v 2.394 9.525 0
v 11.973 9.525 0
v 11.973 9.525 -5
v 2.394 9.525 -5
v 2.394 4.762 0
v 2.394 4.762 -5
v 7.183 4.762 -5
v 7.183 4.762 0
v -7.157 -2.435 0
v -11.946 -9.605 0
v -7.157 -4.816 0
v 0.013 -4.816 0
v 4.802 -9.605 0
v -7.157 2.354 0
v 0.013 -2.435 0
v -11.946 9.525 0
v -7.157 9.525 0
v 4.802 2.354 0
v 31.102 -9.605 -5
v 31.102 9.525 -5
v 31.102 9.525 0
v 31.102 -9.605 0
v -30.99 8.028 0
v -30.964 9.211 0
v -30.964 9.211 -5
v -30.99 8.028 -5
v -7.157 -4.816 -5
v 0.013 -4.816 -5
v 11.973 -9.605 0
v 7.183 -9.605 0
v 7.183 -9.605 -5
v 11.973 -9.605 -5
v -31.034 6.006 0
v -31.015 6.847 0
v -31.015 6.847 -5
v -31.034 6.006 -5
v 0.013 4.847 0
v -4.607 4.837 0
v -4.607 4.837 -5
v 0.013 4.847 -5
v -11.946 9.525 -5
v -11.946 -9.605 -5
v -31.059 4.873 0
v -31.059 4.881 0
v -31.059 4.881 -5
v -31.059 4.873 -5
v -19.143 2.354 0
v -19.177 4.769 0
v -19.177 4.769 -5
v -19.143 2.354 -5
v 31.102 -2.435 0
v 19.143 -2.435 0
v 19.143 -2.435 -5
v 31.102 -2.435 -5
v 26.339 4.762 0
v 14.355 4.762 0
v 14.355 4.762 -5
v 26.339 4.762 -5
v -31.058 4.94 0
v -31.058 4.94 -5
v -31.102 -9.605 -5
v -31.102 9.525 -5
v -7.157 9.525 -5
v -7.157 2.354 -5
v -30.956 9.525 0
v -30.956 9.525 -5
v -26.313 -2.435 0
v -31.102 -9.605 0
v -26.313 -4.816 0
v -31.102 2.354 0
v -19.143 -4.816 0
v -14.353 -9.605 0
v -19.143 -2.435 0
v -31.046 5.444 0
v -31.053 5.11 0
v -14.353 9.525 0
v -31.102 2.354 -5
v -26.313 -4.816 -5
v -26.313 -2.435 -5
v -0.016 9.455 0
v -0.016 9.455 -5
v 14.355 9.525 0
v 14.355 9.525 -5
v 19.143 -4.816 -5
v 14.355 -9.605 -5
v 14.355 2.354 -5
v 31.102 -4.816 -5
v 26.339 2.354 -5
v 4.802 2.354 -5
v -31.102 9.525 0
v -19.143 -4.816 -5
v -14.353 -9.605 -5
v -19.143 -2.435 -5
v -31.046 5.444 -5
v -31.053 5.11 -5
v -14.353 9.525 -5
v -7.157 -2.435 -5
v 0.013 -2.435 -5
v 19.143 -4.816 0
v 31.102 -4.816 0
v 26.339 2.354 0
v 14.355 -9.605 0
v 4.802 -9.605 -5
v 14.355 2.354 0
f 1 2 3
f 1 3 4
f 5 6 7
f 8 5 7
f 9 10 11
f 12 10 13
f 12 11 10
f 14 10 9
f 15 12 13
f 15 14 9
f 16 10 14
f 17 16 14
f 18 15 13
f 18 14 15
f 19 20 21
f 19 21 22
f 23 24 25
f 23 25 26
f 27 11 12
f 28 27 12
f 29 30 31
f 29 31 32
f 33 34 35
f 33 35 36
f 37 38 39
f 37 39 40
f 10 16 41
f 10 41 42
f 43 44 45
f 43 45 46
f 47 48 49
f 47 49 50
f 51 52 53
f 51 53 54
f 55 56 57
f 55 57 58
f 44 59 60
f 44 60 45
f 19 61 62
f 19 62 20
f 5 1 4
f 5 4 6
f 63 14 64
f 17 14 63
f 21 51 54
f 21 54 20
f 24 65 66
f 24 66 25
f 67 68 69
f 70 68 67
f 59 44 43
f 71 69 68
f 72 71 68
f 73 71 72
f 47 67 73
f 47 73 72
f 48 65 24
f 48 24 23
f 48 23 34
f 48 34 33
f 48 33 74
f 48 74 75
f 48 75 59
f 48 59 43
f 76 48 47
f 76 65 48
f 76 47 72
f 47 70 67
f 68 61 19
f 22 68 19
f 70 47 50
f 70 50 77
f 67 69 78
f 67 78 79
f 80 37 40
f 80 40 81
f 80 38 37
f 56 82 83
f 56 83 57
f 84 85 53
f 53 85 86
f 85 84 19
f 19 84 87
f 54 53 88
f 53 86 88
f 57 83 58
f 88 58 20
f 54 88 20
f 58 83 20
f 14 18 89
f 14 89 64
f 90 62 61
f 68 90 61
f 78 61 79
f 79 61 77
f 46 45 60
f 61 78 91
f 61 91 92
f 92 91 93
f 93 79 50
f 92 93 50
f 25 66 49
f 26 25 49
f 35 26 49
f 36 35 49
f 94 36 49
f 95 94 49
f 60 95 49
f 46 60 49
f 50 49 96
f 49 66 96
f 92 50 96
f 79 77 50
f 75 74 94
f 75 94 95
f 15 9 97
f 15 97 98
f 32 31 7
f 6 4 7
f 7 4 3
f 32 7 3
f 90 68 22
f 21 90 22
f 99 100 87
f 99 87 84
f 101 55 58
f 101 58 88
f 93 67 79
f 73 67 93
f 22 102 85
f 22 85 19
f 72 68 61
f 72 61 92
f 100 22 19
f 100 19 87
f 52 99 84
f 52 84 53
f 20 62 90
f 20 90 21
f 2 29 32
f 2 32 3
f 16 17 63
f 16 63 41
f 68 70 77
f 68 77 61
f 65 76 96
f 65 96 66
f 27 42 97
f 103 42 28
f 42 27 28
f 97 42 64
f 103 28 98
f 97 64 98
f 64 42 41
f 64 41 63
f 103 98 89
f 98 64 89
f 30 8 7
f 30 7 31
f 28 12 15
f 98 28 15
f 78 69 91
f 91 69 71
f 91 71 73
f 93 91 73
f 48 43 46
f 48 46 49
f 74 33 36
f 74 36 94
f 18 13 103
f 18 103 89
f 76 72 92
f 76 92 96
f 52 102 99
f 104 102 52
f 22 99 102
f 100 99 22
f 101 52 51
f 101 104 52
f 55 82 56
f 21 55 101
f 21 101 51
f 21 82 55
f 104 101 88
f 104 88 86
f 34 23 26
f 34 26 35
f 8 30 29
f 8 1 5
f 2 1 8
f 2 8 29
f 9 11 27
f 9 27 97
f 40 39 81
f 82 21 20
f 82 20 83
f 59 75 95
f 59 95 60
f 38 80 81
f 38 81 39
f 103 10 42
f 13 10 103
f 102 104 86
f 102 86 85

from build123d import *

# Parameters (mm, degrees)
F1_DEPTH = 5
F0_W     = 7.169912
F0_H     = 2.38125
F0_W_2   = 7.1700136
F3_W     = 62.203203
F3_H     = 19.1299592
F4_DEPTH = 5


with BuildPart() as f1:
    # F0 (on Top) → F1 (new body)
    with BuildSketch(Plane.XY):
        Polygon((19.1430148, -2.4350472), (31.1015888, -2.4350472), (31.1015888, 9.5249746), (14.3546068, 9.5249746), (14.3546068, 4.7624746), (26.3390888, 4.7624746), (26.3390888, 2.3536656), (14.3546068, 2.3536656), (14.3546068, -9.6049846), (31.1015888, -9.6049846), (31.1015888, -4.8162972), (19.1430148, -4.8162972), align=None)
    extrude(amount=-F1_DEPTH)


with BuildPart() as f1b:
    # F0 (on Top) → F1, piece 2 (new body)
    with BuildSketch(Plane.XY):
        Polygon((2.3942548, 4.7624746), (7.1829168, 4.7624746), (7.1829168, -9.6049846), (11.9733568, -9.6049846), (11.9733568, 9.5249746), (2.3942548, 9.5249746), align=None)
    extrude(amount=-F1_DEPTH)


with BuildPart() as f1c:
    # F0 (on Top) → F1, piece 3 (new body)
    with BuildSketch(Plane.XY):
        Polygon((-4.6072552, 4.8368966), (0.0130048, 4.8465486), (-0.0159512, 9.4546166), align=None)
    extrude(amount=-F1_DEPTH)


with BuildPart() as f1d:
    # F0 (on Top) → F1, piece 4 (new body)
    with BuildSketch(Plane.XY):
        Polygon((-7.1569072, 9.5249746), (-11.9455692, 9.5249746), (-11.9455692, -9.6049846), (4.8016668, -9.6049846), (4.8016668, 2.3536656), (-7.1569072, 2.3536656), align=None)
        with Locations((-3.5719512, -3.6256722)):
            Rectangle(F0_W, F0_H, mode=Mode.SUBTRACT)
    extrude(amount=-F1_DEPTH)


with BuildPart() as f1e:
    # F0 (on Top) → F1, piece 5 (new body)
    with BuildSketch(Plane.XY):
        Polygon((-14.3529812, 9.5249746), (-30.956105963, 9.5249746), (-30.9638192, 9.2107766), (-30.9900066, 8.0284066), (-31.014797, 6.8473066), (-31.034101, 6.0055506), (-31.0464708, 5.4444646), (-31.0533796, 5.1096926), (-31.0575198, 4.9402746), (-31.0588914, 4.8808386), (-31.0588914, 4.8727106), (-19.1774572, 4.7693326), (-19.1429132, 2.3536656), (-31.1016142, 2.3536656), (-31.1016142, -9.6049846), (-14.3529812, -9.6049846), align=None)
        with Locations((-22.72792, -3.6256722)):
            Rectangle(F0_W_2, F0_H, mode=Mode.SUBTRACT)
    extrude(amount=-F1_DEPTH)


with BuildPart() as f4:
    # F3 (on offset) → F4 (new body)
    with BuildSketch(Plane(origin=(0, 0, -5), x_dir=(1, 0, 0), z_dir=(0, 0, -1))):
        with Locations((-1.27e-05, 0.040005)):
            Rectangle(F3_W, F3_H)
    extrude(amount=-F4_DEPTH)


solid = Compound([f1.part, f1b.part, f1c.part, f1d.part, f1e.part, f4.part])
